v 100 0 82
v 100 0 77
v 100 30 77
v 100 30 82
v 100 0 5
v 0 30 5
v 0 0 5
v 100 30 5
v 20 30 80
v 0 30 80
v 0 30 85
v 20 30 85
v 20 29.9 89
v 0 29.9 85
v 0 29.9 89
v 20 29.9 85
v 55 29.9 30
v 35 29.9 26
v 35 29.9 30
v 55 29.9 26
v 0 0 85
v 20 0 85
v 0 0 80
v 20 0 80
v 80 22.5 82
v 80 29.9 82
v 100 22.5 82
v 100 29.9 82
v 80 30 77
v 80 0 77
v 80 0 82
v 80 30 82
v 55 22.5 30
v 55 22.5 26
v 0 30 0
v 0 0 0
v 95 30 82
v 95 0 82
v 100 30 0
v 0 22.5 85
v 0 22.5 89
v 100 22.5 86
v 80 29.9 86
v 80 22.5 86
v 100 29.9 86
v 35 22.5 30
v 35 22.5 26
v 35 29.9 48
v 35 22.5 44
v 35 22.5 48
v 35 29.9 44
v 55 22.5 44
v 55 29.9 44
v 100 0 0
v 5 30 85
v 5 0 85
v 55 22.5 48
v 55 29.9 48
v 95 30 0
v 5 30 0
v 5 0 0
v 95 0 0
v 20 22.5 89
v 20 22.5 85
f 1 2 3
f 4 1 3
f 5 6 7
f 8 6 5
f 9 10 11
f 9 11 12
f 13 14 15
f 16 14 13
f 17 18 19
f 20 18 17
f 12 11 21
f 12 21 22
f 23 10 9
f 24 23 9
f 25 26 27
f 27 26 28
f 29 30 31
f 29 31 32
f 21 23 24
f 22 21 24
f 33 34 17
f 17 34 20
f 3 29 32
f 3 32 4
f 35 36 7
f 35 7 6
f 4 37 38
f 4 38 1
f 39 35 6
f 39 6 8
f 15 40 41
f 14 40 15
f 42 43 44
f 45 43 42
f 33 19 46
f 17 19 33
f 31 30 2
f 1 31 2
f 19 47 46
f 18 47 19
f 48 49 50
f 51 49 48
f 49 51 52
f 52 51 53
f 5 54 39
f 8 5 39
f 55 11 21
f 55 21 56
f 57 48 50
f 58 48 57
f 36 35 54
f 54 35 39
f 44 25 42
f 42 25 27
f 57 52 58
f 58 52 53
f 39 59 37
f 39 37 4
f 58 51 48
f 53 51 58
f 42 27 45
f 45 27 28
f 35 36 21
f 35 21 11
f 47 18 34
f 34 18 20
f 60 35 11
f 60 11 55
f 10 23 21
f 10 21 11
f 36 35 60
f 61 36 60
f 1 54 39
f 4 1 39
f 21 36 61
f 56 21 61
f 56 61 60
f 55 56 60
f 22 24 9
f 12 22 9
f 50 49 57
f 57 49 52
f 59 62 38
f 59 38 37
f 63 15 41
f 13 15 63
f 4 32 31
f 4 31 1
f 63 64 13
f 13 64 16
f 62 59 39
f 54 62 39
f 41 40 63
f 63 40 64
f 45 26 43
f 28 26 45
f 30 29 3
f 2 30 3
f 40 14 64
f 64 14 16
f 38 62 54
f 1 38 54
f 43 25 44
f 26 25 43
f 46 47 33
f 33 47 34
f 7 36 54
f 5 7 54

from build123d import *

# Parameters (mm, degrees)
BOX_W        = 100
BOX_H        = 30
BOX_DEPTH    = 5
BOX001_W     = 5
BOX001_H     = 30
BOX001_DEPTH = 85
BOX002_W     = 5
BOX002_H     = 30
BOX002_DEPTH = 82
BOX003_W     = 20
BOX003_H     = 30
BOX003_DEPTH = 5
BOX004_W     = 20
BOX004_H     = 30
BOX004_DEPTH = 5
BOX006_W     = 20
BOX006_H     = 7.4
BOX006_DEPTH = 4
BOX008_W     = 20
BOX008_H     = 7.4
BOX008_DEPTH = 4
BOX009_W     = 20
BOX009_H     = 7.4
BOX009_DEPTH = 4
BOX010_W     = 20
BOX010_H     = 7.4
BOX010_DEPTH = 4


with BuildPart() as base:
    # Box → Box (new body)
    with BuildSketch(Plane.XY):
        with Locations((50, 15)):
            Rectangle(BOX_W, BOX_H)
    extrude(amount=BOX_DEPTH)


with BuildPart() as side_reciever:
    # Box001 → Box001 (new body)
    with BuildSketch(Plane.XY):
        with Locations((2.5, 15)):
            Rectangle(BOX001_W, BOX001_H)
    extrude(amount=BOX001_DEPTH)


with BuildPart() as side_laser:
    # Box002 → Box002 (new body)
    with BuildSketch(Plane(origin=(95, 0, 0), x_dir=(1, 0, 0), z_dir=(0, 0, 1))):
        with Locations((2.5, 15)):
            Rectangle(BOX002_W, BOX002_H)
    extrude(amount=BOX002_DEPTH)


with BuildPart() as platform_laser:
    # Box003 → Box003 (new body)
    with BuildSketch(Plane(origin=(80, 0, 77), x_dir=(1, 0, 0), z_dir=(0, 0, 1))):
        with Locations((10, 15)):
            Rectangle(BOX003_W, BOX003_H)
    extrude(amount=BOX003_DEPTH)


with BuildPart() as platform_reciever:
    # Box004 → Box004 (new body)
    with BuildSketch(Plane.XY.offset(80)):
        with Locations((10, 15)):
            Rectangle(BOX004_W, BOX004_H)
    extrude(amount=BOX004_DEPTH)


with BuildPart() as box006:
    # Box006 → Box006 (new body)
    with BuildSketch(Plane(origin=(0, 22.5, 85), x_dir=(1, 0, 0), z_dir=(0, 0, 1))):
        with Locations((10, 3.7)):
            Rectangle(BOX006_W, BOX006_H)
    extrude(amount=BOX006_DEPTH)


with BuildPart() as box008:
    # Box008 → Box008 (new body)
    with BuildSketch(Plane(origin=(80, 22.5, 82), x_dir=(1, 0, 0), z_dir=(0, 0, 1))):
        with Locations((10, 3.7)):
            Rectangle(BOX008_W, BOX008_H)
    extrude(amount=BOX008_DEPTH)


with BuildPart() as box009:
    # Box009 → Box009 (new body)
    with BuildSketch(Plane(origin=(35, 22.5, 26), x_dir=(1, 0, 0), z_dir=(0, 0, 1))):
        with Locations((10, 3.7)):
            Rectangle(BOX009_W, BOX009_H)
    extrude(amount=BOX009_DEPTH)


with BuildPart() as box010:
    # Box010 → Box010 (new body)
    with BuildSketch(Plane(origin=(35, 22.5, 44), x_dir=(1, 0, 0), z_dir=(0, 0, 1))):
        with Locations((10, 3.7)):
            Rectangle(BOX010_W, BOX010_H)
    extrude(amount=BOX010_DEPTH)


solid = Compound([base.part, side_reciever.part, side_laser.part, platform_laser.part, platform_reciever.part, box006.part, box008.part, box009.part, box010.part])
